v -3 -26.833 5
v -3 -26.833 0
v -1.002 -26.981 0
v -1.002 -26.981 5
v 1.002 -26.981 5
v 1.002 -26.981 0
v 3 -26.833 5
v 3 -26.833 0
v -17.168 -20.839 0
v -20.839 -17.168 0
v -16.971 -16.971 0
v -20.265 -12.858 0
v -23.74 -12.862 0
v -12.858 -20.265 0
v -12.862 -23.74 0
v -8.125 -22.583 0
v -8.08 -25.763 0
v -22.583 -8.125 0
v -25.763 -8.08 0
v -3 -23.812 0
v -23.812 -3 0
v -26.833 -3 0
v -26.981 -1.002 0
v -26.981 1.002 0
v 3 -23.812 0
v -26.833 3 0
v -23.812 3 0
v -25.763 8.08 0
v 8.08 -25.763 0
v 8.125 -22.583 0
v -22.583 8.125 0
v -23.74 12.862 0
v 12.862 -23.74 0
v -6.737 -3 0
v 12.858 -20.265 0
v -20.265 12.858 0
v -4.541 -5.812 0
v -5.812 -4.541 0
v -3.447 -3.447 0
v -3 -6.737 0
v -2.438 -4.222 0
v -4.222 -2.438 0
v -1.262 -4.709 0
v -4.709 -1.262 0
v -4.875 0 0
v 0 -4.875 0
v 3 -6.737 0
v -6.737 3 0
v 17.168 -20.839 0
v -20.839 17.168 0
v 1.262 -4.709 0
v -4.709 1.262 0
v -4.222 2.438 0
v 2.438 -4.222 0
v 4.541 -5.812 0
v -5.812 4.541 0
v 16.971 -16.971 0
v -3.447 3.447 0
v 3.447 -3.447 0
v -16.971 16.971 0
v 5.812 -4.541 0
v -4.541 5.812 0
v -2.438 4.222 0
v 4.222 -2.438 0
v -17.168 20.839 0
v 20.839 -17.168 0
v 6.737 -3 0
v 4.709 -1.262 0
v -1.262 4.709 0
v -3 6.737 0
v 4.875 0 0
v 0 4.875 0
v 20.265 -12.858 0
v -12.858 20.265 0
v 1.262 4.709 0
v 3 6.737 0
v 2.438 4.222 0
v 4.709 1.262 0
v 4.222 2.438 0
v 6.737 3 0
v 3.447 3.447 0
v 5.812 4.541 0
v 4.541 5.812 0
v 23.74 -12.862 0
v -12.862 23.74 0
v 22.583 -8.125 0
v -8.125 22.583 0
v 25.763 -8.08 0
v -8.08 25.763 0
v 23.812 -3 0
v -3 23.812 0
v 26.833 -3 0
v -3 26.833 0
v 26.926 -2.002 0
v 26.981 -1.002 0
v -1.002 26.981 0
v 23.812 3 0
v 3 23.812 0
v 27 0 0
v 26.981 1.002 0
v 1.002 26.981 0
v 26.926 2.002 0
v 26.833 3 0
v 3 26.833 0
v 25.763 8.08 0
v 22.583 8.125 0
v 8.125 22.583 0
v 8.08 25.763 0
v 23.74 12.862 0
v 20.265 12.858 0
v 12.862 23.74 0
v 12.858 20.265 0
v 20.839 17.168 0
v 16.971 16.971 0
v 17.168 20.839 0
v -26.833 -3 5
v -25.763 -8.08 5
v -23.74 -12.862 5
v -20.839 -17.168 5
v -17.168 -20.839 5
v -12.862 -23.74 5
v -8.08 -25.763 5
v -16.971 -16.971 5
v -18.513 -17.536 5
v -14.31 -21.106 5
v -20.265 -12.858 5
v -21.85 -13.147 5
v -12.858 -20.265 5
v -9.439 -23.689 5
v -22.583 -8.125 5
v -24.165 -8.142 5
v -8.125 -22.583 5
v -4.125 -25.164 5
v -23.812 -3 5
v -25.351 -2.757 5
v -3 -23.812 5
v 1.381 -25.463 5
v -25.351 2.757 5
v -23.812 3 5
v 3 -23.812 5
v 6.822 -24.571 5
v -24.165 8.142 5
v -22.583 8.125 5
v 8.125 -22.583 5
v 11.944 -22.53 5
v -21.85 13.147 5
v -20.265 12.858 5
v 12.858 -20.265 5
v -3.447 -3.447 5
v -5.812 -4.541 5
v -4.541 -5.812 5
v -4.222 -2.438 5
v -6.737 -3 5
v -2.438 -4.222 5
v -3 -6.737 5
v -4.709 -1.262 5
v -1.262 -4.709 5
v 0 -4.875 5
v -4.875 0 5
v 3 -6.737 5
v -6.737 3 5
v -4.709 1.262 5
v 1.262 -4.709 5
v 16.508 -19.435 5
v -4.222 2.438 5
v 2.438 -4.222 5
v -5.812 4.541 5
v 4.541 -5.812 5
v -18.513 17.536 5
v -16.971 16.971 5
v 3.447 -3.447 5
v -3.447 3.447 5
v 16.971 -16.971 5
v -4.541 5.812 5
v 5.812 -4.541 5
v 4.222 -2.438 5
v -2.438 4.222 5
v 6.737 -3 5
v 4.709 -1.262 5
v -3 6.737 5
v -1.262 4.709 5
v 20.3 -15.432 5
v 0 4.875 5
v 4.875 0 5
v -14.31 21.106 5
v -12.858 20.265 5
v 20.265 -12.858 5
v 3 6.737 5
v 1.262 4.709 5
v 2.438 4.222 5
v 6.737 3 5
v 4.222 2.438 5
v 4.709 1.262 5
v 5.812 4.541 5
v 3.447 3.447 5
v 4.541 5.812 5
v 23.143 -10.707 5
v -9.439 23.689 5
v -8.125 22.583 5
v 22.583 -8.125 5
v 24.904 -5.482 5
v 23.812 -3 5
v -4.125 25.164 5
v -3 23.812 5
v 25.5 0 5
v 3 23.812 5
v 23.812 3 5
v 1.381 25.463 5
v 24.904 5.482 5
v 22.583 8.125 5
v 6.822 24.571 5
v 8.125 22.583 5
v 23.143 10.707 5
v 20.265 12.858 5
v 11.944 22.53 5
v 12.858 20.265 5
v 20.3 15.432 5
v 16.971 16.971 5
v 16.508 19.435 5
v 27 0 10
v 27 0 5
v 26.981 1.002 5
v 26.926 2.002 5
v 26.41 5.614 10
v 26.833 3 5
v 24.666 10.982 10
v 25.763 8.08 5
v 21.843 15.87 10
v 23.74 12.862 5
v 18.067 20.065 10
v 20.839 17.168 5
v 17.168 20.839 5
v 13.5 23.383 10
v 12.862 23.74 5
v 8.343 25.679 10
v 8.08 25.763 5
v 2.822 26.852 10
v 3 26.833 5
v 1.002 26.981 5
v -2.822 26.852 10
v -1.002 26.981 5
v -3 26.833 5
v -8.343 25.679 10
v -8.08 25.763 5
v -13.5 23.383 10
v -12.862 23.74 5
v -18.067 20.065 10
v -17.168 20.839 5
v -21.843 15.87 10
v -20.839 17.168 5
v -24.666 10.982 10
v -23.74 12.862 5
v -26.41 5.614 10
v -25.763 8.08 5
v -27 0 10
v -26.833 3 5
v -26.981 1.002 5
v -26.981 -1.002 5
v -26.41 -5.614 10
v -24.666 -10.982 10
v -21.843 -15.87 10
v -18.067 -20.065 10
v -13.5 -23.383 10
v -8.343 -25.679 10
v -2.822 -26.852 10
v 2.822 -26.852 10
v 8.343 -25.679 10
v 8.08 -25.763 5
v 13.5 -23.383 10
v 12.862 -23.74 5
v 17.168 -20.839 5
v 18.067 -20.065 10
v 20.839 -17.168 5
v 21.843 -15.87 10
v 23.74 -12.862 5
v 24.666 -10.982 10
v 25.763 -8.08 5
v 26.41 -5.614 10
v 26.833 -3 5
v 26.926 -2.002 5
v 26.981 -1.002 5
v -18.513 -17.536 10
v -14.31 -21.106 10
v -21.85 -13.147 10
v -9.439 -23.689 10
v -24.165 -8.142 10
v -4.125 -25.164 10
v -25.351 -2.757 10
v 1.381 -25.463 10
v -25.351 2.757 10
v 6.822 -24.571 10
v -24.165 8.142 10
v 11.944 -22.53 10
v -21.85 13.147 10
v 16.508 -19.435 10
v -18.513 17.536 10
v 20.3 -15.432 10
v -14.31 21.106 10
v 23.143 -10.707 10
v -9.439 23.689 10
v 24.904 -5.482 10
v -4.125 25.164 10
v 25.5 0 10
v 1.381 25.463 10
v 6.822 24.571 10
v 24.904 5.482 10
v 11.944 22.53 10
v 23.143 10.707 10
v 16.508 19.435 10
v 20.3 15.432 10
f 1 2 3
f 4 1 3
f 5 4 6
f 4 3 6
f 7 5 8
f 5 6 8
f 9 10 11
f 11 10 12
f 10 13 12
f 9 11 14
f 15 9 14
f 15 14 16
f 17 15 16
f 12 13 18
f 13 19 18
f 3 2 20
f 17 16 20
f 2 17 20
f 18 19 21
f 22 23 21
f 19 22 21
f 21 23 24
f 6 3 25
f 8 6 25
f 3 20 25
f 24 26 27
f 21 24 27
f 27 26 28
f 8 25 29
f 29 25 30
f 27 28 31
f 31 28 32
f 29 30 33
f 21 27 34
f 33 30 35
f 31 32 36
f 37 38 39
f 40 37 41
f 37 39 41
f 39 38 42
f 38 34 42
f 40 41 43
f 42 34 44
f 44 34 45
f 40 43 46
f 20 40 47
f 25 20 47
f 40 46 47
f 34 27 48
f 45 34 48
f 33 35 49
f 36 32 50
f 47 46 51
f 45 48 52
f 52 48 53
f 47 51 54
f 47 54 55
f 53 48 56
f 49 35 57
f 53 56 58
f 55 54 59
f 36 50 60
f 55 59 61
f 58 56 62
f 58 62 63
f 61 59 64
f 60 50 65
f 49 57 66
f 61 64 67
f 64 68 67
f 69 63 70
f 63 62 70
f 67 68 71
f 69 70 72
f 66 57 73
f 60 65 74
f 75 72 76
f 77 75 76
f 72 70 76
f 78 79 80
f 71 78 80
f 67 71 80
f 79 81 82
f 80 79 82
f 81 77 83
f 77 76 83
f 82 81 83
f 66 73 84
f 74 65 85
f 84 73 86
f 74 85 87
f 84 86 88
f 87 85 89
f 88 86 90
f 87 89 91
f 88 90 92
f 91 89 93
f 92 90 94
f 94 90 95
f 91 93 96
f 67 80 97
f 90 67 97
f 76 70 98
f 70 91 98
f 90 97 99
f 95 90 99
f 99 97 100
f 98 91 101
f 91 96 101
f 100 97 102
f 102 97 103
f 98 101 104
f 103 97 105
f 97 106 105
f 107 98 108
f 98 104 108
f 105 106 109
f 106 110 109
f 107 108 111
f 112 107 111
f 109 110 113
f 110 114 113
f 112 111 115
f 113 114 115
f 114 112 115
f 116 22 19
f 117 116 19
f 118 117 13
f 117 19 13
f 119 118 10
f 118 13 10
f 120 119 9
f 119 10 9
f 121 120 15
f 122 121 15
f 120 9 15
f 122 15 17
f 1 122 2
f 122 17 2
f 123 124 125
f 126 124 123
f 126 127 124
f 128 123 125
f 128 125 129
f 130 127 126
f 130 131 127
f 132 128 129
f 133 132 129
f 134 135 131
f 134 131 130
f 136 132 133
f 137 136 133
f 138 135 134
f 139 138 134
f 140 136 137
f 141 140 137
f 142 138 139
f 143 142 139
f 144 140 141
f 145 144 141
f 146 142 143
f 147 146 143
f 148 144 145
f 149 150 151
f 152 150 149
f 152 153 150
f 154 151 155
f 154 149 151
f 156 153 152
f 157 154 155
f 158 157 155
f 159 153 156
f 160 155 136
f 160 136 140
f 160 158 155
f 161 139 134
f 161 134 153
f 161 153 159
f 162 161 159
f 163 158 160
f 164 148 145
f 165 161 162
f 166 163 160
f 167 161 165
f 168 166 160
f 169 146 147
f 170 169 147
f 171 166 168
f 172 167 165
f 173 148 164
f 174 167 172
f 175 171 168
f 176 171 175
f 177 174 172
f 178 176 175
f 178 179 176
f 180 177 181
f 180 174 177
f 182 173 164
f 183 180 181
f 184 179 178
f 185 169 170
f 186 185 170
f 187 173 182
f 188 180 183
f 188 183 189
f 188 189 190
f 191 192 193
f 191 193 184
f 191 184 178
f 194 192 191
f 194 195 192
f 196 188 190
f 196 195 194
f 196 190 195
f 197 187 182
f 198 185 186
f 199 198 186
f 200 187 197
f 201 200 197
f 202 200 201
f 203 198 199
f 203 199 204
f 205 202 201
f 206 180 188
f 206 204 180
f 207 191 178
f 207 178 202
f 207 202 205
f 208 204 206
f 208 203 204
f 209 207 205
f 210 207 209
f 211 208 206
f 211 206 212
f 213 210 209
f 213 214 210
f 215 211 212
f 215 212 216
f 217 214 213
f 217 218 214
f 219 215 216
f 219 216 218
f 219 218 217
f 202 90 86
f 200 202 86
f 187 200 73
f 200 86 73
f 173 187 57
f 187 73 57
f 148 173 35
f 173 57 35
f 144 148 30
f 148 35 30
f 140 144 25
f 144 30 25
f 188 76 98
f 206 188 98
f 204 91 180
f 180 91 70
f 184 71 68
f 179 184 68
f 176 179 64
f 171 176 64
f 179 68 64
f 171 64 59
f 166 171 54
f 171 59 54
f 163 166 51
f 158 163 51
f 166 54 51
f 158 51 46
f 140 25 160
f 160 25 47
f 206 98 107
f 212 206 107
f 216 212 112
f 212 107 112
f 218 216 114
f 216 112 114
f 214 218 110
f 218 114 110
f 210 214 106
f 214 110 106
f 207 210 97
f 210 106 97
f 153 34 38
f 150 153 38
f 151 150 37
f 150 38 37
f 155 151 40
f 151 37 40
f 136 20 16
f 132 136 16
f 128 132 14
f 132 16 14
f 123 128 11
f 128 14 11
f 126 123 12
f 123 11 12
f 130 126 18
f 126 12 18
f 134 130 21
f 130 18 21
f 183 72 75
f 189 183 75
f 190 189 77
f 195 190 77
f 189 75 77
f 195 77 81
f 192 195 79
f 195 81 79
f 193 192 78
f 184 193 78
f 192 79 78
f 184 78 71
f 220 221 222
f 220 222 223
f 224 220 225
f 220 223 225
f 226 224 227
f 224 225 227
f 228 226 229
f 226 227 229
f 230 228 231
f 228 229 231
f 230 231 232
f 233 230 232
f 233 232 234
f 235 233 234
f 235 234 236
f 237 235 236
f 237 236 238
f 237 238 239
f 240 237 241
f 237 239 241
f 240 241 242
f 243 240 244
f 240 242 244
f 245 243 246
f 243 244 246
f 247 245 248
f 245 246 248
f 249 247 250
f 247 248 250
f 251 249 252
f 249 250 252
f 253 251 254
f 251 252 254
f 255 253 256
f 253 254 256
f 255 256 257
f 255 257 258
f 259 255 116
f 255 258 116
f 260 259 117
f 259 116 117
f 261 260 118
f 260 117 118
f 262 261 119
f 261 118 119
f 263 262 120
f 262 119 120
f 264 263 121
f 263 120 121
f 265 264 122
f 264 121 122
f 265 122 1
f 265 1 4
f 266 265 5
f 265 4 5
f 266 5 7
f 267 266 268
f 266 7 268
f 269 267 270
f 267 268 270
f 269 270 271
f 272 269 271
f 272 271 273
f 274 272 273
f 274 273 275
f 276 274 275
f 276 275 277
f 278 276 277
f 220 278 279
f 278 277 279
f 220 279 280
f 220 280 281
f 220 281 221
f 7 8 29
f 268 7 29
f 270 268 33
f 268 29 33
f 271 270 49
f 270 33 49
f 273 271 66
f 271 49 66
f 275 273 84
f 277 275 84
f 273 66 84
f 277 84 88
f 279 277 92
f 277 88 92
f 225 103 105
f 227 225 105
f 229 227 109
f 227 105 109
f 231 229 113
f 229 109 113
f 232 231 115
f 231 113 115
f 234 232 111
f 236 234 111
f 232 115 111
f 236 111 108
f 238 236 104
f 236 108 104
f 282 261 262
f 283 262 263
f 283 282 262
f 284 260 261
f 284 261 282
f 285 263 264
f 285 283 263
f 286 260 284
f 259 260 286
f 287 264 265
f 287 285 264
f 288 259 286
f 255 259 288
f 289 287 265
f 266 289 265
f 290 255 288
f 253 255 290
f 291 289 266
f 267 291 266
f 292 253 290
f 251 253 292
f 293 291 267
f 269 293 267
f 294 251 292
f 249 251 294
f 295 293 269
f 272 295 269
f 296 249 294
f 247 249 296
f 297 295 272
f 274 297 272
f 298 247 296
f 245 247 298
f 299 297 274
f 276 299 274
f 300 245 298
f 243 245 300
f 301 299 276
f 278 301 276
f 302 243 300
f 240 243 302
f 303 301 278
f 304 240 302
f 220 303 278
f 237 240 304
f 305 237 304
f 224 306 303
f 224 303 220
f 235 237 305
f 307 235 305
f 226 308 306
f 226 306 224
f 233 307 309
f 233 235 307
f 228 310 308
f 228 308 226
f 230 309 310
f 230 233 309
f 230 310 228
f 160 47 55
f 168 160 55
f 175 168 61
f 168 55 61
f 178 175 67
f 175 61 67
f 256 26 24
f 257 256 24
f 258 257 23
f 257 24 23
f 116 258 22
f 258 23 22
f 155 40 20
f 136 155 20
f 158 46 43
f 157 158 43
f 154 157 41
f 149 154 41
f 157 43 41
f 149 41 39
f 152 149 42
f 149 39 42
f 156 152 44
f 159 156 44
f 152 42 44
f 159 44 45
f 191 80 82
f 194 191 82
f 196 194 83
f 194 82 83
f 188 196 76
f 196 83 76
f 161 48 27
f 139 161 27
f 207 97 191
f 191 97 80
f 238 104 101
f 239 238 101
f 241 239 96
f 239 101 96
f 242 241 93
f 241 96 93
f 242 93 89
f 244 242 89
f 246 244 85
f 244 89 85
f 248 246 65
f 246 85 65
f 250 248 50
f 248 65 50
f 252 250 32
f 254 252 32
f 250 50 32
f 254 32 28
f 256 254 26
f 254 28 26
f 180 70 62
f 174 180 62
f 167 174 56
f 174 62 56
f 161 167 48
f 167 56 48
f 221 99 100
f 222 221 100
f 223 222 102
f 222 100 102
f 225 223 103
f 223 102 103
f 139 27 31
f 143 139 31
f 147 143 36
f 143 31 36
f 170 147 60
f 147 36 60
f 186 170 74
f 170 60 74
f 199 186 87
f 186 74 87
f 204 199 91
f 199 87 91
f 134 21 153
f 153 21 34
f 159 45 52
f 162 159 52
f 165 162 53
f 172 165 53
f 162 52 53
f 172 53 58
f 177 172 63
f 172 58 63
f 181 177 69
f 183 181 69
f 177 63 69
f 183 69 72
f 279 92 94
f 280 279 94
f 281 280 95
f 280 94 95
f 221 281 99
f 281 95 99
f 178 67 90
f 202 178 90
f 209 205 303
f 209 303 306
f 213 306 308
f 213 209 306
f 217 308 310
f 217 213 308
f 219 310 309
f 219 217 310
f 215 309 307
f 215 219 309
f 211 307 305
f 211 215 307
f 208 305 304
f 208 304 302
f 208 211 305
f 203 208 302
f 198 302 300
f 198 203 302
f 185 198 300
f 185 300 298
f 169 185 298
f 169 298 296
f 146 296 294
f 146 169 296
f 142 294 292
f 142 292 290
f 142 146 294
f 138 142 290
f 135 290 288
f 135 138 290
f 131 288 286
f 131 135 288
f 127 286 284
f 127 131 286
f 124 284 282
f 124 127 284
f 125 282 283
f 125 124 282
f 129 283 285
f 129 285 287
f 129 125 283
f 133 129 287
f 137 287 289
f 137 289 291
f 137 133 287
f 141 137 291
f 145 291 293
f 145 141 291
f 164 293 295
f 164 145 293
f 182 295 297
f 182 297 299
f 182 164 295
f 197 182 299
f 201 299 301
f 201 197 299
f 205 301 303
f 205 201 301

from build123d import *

# Parameters (mm, degrees)
F1_DEPTH = 5
F2_R     = 27
F2_R_2   = 25.5
F3_DEPTH = 5


# Not quite as in the source:
# - a feature names something its author has since deleted; it is built from what else it names


with BuildPart() as f1:
    # F0 (on Top) → F1 (new body)
    with BuildSketch(Plane.XY):
        with BuildLine():
            Line((26.83281573, 3), (23.8117617996, 3))
            ThreePointArc((23.8117617996, 3), (23.9528942217, 1.502949901), (24, 0))
            ThreePointArc((24, 0), (23.9528942217, -1.502949901), (23.8117617996, -3))
            Line((23.8117617996, -3), (26.83281573, -3))
            ThreePointArc((26.83281573, -3), (26.9581715321, -1.5023274094), (27, 0))
            ThreePointArc((27, 0), (26.9581715321, 1.5023274094), (26.83281573, 3))
        make_face()
        with BuildLine():
            ThreePointArc((3, 23.8117617996), (16.9705627485, 16.9705627485), (23.8117617996, 3))
            Line((23.8117617996, 3), (26.83281573, 3))
            ThreePointArc((26.83281573, 3), (19.091883092, 19.091883092), (3, 26.83281573))
            Line((3, 26.83281573), (3, 23.8117617996))
        make_face()
        with BuildLine():
            Line((26.83281573, -3), (23.8117617996, -3))
            ThreePointArc((23.8117617996, -3), (16.9705627485, -16.9705627485), (3, -23.8117617996))
            Line((3, -23.8117617996), (3, -26.83281573))
            ThreePointArc((3, -26.83281573), (19.091883092, -19.091883092), (26.83281573, -3))
        make_face()
        with BuildLine():
            ThreePointArc((-3, 23.8117617996), (0, 24), (3, 23.8117617996))
            Line((3, 23.8117617996), (3, 26.83281573))
            ThreePointArc((3, 26.83281573), (0, 27), (-3, 26.83281573))
            Line((-3, 26.83281573), (-3, 23.8117617996))
        make_face()
        with BuildLine():
            ThreePointArc((-23.8117617996, 3), (-16.9705627485, 16.9705627485), (-3, 23.8117617996))
            Line((-3, 23.8117617996), (-3, 26.83281573))
            ThreePointArc((-3, 26.83281573), (-19.091883092, 19.091883092), (-26.83281573, 3))
            Line((-26.83281573, 3), (-23.8117617996, 3))
        make_face()
        with BuildLine():
            Line((-3, -26.83281573), (-3, -23.8117617996))
            ThreePointArc((-3, -23.8117617996), (-16.9705627485, -16.9705627485), (-23.8117617996, -3))
            Line((-23.8117617996, -3), (-26.83281573, -3))
            ThreePointArc((-26.83281573, -3), (-19.091883092, -19.091883092), (-3, -26.83281573))
        make_face()
        with BuildLine():
            ThreePointArc((3, -23.8117617996), (0, -24), (-3, -23.8117617996))
            Line((-3, -23.8117617996), (-3, -26.83281573))
            ThreePointArc((-3, -26.83281573), (0, -27), (3, -26.83281573))
            Line((3, -26.83281573), (3, -23.8117617996))
        make_face()
        with BuildLine():
            ThreePointArc((-23.8117617996, -3), (-24, 0), (-23.8117617996, 3))
            Line((-23.8117617996, 3), (-26.83281573, 3))
            ThreePointArc((-26.83281573, 3), (-27, 0), (-26.83281573, -3))
            Line((-26.83281573, -3), (-23.8117617996, -3))
        make_face()
        with BuildLine():
            ThreePointArc((-6.7372564891, -3), (-7.2138024511, -1.5335185674), (-7.375, 0))
            ThreePointArc((-7.375, 0), (-7.2138024511, 1.5335185674), (-6.7372564891, 3))
            Line((-6.7372564891, 3), (-23.8117617996, 3))
            ThreePointArc((-23.8117617996, 3), (-24, 0), (-23.8117617996, -3))
            Line((-23.8117617996, -3), (-6.7372564891, -3))
        make_face()
        with BuildLine():
            ThreePointArc((-4.875, 0), (-3.4471455583, 3.4471455583), (0, 4.875))
            Line((0, 4.875), (0, 7.375))
            ThreePointArc((0, 7.375), (-1.5335185674, 7.2138024511), (-3, 6.7372564891))
            ThreePointArc((-3, 6.7372564891), (-5.2149125113, 5.2149125113), (-6.7372564891, 3))
            ThreePointArc((-6.7372564891, 3), (-7.2138024511, 1.5335185674), (-7.375, 0))
            Line((-7.375, 0), (-4.875, 0))
        make_face()
        with BuildLine():
            Line((0, -7.375), (0, -4.875))
            ThreePointArc((0, -4.875), (-3.4471455583, -3.4471455583), (-4.875, 0))
            Line((-4.875, 0), (-7.375, 0))
            ThreePointArc((-7.375, 0), (-7.2138024511, -1.5335185674), (-6.7372564891, -3))
            ThreePointArc((-6.7372564891, -3), (-5.2149125113, -5.2149125113), (-3, -6.7372564891))
            ThreePointArc((-3, -6.7372564891), (-1.5335185674, -7.2138024511), (0, -7.375))
        make_face()
        with BuildLine():
            Line((7.375, 0), (4.875, 0))
            ThreePointArc((4.875, 0), (3.4471455583, -3.4471455583), (0, -4.875))
            Line((0, -4.875), (0, -7.375))
            ThreePointArc((0, -7.375), (1.5335185674, -7.2138024511), (3, -6.7372564891))
            ThreePointArc((3, -6.7372564891), (5.2149125113, -5.2149125113), (6.7372564891, -3))
            ThreePointArc((6.7372564891, -3), (7.2138024511, -1.5335185674), (7.375, 0))
        make_face()
        with BuildLine():
            ThreePointArc((0, 4.875), (3.4471455583, 3.4471455583), (4.875, 0))
            Line((4.875, 0), (7.375, 0))
            ThreePointArc((7.375, 0), (7.2138024511, 1.5335185674), (6.7372564891, 3))
            ThreePointArc((6.7372564891, 3), (5.2149125113, 5.2149125113), (3, 6.7372564891))
            ThreePointArc((3, 6.7372564891), (1.5335185674, 7.2138024511), (0, 7.375))
            Line((0, 7.375), (0, 4.875))
        make_face()
        with BuildLine():
            ThreePointArc((-3, 6.7372564891), (-1.5335185674, 7.2138024511), (0, 7.375))
            ThreePointArc((0, 7.375), (1.5335185674, 7.2138024511), (3, 6.7372564891))
            Line((3, 6.7372564891), (3, 23.8117617996))
            ThreePointArc((3, 23.8117617996), (0, 24), (-3, 23.8117617996))
            Line((-3, 23.8117617996), (-3, 6.7372564891))
        make_face()
        with BuildLine():
            ThreePointArc((6.7372564891, 3), (7.2138024511, 1.5335185674), (7.375, 0))
            ThreePointArc((7.375, 0), (7.2138024511, -1.5335185674), (6.7372564891, -3))
            Line((6.7372564891, -3), (23.8117617996, -3))
            ThreePointArc((23.8117617996, -3), (23.9528942217, -1.502949901), (24, 0))
            ThreePointArc((24, 0), (23.9528942217, 1.502949901), (23.8117617996, 3))
            Line((23.8117617996, 3), (6.7372564891, 3))
        make_face()
        with BuildLine():
            ThreePointArc((3, -6.7372564891), (1.5335185674, -7.2138024511), (0, -7.375))
            ThreePointArc((0, -7.375), (-1.5335185674, -7.2138024511), (-3, -6.7372564891))
            Line((-3, -6.7372564891), (-3, -23.8117617996))
            ThreePointArc((-3, -23.8117617996), (0, -24), (3, -23.8117617996))
            Line((3, -23.8117617996), (3, -6.7372564891))
        make_face()
    extrude(amount=F1_DEPTH)

    # F2 (on face) → F3 (join)
    with BuildSketch(Plane.XY.offset(5)):
        Circle(F2_R)
        Circle(F2_R_2, mode=Mode.SUBTRACT)
    extrude(amount=F3_DEPTH)


solid = f1.part
